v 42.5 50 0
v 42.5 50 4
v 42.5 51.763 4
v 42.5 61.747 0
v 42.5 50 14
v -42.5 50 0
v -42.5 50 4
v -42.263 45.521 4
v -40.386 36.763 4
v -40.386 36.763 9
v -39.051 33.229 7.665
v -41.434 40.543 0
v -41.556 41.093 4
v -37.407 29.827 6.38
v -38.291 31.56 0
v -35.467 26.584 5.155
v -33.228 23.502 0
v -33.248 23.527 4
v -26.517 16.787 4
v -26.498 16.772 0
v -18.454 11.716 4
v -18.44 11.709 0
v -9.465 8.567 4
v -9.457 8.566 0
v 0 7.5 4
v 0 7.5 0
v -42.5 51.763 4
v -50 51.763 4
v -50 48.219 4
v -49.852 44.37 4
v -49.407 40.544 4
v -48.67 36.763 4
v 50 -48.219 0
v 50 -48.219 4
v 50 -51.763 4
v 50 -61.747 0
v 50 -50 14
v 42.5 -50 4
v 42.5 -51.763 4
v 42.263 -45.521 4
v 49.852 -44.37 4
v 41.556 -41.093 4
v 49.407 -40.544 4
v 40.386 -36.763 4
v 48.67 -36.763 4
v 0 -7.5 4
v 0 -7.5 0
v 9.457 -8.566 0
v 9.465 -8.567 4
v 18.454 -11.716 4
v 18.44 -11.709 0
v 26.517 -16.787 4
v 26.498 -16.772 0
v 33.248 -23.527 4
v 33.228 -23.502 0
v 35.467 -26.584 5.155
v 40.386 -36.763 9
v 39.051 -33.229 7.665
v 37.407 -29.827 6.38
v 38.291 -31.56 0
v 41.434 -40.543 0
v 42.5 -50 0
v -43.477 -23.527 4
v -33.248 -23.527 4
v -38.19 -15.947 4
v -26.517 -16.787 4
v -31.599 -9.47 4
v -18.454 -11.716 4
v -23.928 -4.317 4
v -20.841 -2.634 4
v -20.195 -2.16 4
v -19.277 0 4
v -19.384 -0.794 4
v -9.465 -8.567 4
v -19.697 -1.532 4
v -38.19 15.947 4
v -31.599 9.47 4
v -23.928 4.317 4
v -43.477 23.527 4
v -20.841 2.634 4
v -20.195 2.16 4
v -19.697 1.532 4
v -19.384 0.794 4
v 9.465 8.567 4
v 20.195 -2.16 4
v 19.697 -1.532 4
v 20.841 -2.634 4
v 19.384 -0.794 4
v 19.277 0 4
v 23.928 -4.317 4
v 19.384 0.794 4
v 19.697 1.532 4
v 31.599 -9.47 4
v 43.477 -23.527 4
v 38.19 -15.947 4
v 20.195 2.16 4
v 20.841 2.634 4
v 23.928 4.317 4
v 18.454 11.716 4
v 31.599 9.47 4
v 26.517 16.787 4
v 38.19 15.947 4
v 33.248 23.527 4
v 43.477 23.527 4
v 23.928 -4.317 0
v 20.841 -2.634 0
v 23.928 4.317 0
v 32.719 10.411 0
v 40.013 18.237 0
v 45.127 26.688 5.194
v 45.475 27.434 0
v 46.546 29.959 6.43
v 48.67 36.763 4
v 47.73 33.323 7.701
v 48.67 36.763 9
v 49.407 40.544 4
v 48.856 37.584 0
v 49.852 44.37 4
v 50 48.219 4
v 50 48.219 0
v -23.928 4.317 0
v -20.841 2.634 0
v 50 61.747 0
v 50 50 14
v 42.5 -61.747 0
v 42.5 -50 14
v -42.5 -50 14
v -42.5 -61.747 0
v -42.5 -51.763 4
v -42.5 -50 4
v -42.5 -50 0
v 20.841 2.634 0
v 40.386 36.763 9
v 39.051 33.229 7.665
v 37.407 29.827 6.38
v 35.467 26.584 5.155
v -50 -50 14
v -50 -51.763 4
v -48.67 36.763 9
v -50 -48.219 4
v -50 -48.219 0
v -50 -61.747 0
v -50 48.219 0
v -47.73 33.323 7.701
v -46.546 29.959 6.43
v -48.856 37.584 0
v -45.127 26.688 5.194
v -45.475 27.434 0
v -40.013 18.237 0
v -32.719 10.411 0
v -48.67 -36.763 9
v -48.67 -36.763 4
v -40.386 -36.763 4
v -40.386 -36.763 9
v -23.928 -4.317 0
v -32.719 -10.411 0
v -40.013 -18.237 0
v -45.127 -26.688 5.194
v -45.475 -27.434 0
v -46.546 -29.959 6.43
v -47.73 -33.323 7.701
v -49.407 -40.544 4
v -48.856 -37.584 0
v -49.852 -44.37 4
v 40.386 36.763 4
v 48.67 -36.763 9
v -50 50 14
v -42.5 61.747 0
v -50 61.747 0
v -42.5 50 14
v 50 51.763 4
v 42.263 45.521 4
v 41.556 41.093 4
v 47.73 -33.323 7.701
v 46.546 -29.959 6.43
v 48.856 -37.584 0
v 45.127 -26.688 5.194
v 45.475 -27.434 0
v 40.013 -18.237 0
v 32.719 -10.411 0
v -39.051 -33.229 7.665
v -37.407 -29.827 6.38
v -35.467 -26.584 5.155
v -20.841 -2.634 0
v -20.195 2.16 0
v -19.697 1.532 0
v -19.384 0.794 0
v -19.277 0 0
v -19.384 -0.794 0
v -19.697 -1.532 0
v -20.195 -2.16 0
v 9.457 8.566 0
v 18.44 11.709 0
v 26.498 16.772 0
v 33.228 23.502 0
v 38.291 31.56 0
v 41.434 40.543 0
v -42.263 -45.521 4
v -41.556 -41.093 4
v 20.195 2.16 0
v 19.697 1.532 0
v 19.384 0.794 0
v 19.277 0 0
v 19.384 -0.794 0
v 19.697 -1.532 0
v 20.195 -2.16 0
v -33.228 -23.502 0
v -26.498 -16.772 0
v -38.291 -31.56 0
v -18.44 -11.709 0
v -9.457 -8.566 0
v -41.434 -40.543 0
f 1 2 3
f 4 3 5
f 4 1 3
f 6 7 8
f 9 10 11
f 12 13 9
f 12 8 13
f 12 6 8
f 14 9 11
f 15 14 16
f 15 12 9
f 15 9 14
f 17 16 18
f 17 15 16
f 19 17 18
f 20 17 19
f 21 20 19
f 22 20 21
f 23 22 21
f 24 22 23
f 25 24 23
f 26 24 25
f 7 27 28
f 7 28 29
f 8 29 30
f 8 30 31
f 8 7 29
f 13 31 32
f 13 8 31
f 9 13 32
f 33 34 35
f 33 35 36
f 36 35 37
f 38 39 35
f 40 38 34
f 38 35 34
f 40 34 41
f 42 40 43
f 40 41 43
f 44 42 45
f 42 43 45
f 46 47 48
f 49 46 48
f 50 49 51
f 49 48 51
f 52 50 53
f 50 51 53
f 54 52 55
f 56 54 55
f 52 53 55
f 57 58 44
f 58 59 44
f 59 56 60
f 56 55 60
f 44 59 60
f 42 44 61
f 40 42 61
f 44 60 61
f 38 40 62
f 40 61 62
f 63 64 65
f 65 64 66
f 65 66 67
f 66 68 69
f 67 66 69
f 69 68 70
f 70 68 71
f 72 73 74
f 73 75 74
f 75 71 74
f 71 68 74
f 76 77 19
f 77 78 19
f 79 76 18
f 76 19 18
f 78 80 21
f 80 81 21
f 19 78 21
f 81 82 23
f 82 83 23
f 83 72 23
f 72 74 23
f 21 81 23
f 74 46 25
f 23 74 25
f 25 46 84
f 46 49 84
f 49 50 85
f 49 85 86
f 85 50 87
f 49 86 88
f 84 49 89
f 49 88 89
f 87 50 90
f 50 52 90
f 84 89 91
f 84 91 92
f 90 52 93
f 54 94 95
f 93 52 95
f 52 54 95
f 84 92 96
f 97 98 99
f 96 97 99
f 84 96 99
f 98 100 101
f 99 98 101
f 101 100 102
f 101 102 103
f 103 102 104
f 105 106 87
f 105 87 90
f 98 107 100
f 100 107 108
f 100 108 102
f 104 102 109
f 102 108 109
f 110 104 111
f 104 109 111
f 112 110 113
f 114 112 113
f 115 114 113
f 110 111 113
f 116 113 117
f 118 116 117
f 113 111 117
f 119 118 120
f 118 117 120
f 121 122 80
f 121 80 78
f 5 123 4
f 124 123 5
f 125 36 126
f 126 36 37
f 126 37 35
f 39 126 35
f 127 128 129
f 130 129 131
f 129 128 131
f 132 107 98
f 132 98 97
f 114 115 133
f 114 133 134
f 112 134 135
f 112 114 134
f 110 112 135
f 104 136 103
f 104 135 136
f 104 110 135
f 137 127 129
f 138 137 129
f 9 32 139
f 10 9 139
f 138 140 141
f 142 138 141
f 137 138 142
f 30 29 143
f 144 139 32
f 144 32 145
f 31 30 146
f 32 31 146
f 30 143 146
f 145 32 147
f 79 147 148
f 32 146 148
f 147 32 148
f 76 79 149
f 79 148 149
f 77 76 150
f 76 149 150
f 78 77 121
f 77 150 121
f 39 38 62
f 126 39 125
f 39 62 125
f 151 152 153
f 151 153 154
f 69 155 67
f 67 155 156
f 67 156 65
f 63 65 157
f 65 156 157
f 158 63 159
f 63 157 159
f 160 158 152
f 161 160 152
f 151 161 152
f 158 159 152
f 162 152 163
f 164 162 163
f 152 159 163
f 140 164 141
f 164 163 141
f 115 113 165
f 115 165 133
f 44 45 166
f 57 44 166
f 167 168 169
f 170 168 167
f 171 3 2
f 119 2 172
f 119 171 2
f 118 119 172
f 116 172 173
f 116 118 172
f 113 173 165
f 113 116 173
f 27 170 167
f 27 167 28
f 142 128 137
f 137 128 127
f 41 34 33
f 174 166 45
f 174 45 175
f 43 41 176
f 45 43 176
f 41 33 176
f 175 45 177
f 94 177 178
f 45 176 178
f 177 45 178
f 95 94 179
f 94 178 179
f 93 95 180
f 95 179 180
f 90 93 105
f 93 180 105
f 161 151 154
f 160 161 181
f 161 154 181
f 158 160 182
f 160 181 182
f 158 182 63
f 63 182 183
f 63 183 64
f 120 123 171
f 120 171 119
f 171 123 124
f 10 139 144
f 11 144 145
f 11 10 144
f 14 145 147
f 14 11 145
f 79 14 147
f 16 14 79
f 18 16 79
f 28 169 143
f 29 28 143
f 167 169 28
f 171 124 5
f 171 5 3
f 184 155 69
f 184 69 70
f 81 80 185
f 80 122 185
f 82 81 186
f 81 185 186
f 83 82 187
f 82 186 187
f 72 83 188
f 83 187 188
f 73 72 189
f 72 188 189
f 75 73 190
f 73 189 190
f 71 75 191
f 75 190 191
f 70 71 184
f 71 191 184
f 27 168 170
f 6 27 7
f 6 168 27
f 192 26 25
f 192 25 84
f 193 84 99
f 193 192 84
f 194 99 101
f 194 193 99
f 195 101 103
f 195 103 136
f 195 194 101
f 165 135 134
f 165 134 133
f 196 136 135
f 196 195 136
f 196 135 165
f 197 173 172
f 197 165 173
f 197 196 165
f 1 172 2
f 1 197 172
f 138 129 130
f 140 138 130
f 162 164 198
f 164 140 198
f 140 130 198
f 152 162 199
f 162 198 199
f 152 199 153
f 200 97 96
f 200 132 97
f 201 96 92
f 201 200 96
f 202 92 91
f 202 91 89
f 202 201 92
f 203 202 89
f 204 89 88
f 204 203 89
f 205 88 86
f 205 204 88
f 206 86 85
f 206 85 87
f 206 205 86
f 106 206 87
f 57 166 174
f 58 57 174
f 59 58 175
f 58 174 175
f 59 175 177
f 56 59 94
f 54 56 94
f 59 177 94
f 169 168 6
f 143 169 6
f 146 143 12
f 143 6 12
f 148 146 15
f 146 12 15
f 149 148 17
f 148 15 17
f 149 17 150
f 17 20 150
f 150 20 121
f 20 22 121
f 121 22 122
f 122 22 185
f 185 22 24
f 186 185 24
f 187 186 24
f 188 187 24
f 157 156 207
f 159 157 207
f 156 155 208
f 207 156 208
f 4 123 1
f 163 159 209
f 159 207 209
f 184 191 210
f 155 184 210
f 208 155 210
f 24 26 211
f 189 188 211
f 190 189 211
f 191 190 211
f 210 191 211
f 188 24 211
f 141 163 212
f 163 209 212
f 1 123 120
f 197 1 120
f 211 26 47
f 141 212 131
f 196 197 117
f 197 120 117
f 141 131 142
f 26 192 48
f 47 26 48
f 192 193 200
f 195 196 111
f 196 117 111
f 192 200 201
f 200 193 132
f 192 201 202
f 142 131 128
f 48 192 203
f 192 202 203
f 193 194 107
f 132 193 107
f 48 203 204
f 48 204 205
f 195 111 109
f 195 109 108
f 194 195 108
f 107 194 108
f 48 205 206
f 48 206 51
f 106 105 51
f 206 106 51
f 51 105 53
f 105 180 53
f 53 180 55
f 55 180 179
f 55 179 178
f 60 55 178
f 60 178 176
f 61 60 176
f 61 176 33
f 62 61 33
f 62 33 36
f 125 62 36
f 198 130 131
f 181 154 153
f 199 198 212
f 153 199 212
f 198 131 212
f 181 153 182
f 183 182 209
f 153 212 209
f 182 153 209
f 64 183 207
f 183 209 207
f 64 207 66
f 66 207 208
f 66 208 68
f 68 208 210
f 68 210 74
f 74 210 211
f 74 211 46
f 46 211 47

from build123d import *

# Parameters (mm, degrees)
F1_DEPTH = 50
F4_DEPTH = 14.001
F6_DEPTH = 4
F7_R     = 50
F8_R     = 3


# Not quite as in the source:
# - a pattern or mirror of a feature is missing from the dataset's text; its kind, count and spacing are read off the source's solid


with BuildPart() as f1:
    # F0 (on Right) → F1 (new body, symmetric)
    with BuildSketch(Plane.YZ):
        Polygon((0, 4), (0, 0), (61.7473948365, 0), (50, 14), (51.7632698071, 4), (36.7632698071, 4), (36.7632698071, 9), (23.5265396142, 4), align=None)
    extrude(amount=F1_DEPTH, both=True)

    # F2: F1 across face


with BuildPart() as f1_1:
    add(f1.part)
    add(f1.part.mirror(Plane(origin=(0, 0, 2), x_dir=(1, 0, 0), z_dir=(0, -1, 0))))

    # F3 (on face) → F4 (cut, through all)
    with BuildSketch(Plane(origin=(0, 0, 0), x_dir=(1, 0, 0), z_dir=(0, 0, -1))):
        with BuildLine():
            Line((42.5, 50), (42.5, 61.7473948365))
            Line((42.5, 61.7473948365), (0, 61.7473948365))
            Line((0, 61.7473948365), (-42.5, 61.7473948365))
            Line((-42.5, 61.7473948365), (-42.5, 50))
            ThreePointArc((-42.5, 50), (-30.0520382004, 19.9479617996), (0, 7.5))
            ThreePointArc((0, 7.5), (30.0520382004, 19.9479617996), (42.5, 50))
        make_face()
    f4 = extrude(amount=-F4_DEPTH, mode=Mode.SUBTRACT)

    # F4_copies: F4 across plane
    add(f4.mirror(Plane.ZX), mode=Mode.SUBTRACT)

    # F5 (on face) → F6 (cut, through all)
    with BuildSketch(Plane.XY.offset(4)):
        Polygon((-50, 18.5265396142), (-50, -18.5265396142), (-16.0078105936, 0), align=None)
        Polygon((50, 18.5265396142), (16.0078105936, 0), (50, -18.5265396142), align=None)
    extrude(amount=-F6_DEPTH, mode=Mode.SUBTRACT)

    # F7
    f7_edges = [f1_1.edges().sort_by_distance(p)[0] for p in [
        (50, -18.52654, 2),
        (50, 18.52654, 2),
        (-50, -18.52654, 2),
        (-50, 18.52654, 2),
    ]]
    fillet(f7_edges, radius=F7_R)

    # F8
    f8_edges = [f1_1.edges().sort_by_distance(p)[0] for p in [
        (-16.007811, 0, 2),
        (16.007811, 0, 2),
    ]]
    fillet(f8_edges, radius=F8_R)


solid = f1_1.part
